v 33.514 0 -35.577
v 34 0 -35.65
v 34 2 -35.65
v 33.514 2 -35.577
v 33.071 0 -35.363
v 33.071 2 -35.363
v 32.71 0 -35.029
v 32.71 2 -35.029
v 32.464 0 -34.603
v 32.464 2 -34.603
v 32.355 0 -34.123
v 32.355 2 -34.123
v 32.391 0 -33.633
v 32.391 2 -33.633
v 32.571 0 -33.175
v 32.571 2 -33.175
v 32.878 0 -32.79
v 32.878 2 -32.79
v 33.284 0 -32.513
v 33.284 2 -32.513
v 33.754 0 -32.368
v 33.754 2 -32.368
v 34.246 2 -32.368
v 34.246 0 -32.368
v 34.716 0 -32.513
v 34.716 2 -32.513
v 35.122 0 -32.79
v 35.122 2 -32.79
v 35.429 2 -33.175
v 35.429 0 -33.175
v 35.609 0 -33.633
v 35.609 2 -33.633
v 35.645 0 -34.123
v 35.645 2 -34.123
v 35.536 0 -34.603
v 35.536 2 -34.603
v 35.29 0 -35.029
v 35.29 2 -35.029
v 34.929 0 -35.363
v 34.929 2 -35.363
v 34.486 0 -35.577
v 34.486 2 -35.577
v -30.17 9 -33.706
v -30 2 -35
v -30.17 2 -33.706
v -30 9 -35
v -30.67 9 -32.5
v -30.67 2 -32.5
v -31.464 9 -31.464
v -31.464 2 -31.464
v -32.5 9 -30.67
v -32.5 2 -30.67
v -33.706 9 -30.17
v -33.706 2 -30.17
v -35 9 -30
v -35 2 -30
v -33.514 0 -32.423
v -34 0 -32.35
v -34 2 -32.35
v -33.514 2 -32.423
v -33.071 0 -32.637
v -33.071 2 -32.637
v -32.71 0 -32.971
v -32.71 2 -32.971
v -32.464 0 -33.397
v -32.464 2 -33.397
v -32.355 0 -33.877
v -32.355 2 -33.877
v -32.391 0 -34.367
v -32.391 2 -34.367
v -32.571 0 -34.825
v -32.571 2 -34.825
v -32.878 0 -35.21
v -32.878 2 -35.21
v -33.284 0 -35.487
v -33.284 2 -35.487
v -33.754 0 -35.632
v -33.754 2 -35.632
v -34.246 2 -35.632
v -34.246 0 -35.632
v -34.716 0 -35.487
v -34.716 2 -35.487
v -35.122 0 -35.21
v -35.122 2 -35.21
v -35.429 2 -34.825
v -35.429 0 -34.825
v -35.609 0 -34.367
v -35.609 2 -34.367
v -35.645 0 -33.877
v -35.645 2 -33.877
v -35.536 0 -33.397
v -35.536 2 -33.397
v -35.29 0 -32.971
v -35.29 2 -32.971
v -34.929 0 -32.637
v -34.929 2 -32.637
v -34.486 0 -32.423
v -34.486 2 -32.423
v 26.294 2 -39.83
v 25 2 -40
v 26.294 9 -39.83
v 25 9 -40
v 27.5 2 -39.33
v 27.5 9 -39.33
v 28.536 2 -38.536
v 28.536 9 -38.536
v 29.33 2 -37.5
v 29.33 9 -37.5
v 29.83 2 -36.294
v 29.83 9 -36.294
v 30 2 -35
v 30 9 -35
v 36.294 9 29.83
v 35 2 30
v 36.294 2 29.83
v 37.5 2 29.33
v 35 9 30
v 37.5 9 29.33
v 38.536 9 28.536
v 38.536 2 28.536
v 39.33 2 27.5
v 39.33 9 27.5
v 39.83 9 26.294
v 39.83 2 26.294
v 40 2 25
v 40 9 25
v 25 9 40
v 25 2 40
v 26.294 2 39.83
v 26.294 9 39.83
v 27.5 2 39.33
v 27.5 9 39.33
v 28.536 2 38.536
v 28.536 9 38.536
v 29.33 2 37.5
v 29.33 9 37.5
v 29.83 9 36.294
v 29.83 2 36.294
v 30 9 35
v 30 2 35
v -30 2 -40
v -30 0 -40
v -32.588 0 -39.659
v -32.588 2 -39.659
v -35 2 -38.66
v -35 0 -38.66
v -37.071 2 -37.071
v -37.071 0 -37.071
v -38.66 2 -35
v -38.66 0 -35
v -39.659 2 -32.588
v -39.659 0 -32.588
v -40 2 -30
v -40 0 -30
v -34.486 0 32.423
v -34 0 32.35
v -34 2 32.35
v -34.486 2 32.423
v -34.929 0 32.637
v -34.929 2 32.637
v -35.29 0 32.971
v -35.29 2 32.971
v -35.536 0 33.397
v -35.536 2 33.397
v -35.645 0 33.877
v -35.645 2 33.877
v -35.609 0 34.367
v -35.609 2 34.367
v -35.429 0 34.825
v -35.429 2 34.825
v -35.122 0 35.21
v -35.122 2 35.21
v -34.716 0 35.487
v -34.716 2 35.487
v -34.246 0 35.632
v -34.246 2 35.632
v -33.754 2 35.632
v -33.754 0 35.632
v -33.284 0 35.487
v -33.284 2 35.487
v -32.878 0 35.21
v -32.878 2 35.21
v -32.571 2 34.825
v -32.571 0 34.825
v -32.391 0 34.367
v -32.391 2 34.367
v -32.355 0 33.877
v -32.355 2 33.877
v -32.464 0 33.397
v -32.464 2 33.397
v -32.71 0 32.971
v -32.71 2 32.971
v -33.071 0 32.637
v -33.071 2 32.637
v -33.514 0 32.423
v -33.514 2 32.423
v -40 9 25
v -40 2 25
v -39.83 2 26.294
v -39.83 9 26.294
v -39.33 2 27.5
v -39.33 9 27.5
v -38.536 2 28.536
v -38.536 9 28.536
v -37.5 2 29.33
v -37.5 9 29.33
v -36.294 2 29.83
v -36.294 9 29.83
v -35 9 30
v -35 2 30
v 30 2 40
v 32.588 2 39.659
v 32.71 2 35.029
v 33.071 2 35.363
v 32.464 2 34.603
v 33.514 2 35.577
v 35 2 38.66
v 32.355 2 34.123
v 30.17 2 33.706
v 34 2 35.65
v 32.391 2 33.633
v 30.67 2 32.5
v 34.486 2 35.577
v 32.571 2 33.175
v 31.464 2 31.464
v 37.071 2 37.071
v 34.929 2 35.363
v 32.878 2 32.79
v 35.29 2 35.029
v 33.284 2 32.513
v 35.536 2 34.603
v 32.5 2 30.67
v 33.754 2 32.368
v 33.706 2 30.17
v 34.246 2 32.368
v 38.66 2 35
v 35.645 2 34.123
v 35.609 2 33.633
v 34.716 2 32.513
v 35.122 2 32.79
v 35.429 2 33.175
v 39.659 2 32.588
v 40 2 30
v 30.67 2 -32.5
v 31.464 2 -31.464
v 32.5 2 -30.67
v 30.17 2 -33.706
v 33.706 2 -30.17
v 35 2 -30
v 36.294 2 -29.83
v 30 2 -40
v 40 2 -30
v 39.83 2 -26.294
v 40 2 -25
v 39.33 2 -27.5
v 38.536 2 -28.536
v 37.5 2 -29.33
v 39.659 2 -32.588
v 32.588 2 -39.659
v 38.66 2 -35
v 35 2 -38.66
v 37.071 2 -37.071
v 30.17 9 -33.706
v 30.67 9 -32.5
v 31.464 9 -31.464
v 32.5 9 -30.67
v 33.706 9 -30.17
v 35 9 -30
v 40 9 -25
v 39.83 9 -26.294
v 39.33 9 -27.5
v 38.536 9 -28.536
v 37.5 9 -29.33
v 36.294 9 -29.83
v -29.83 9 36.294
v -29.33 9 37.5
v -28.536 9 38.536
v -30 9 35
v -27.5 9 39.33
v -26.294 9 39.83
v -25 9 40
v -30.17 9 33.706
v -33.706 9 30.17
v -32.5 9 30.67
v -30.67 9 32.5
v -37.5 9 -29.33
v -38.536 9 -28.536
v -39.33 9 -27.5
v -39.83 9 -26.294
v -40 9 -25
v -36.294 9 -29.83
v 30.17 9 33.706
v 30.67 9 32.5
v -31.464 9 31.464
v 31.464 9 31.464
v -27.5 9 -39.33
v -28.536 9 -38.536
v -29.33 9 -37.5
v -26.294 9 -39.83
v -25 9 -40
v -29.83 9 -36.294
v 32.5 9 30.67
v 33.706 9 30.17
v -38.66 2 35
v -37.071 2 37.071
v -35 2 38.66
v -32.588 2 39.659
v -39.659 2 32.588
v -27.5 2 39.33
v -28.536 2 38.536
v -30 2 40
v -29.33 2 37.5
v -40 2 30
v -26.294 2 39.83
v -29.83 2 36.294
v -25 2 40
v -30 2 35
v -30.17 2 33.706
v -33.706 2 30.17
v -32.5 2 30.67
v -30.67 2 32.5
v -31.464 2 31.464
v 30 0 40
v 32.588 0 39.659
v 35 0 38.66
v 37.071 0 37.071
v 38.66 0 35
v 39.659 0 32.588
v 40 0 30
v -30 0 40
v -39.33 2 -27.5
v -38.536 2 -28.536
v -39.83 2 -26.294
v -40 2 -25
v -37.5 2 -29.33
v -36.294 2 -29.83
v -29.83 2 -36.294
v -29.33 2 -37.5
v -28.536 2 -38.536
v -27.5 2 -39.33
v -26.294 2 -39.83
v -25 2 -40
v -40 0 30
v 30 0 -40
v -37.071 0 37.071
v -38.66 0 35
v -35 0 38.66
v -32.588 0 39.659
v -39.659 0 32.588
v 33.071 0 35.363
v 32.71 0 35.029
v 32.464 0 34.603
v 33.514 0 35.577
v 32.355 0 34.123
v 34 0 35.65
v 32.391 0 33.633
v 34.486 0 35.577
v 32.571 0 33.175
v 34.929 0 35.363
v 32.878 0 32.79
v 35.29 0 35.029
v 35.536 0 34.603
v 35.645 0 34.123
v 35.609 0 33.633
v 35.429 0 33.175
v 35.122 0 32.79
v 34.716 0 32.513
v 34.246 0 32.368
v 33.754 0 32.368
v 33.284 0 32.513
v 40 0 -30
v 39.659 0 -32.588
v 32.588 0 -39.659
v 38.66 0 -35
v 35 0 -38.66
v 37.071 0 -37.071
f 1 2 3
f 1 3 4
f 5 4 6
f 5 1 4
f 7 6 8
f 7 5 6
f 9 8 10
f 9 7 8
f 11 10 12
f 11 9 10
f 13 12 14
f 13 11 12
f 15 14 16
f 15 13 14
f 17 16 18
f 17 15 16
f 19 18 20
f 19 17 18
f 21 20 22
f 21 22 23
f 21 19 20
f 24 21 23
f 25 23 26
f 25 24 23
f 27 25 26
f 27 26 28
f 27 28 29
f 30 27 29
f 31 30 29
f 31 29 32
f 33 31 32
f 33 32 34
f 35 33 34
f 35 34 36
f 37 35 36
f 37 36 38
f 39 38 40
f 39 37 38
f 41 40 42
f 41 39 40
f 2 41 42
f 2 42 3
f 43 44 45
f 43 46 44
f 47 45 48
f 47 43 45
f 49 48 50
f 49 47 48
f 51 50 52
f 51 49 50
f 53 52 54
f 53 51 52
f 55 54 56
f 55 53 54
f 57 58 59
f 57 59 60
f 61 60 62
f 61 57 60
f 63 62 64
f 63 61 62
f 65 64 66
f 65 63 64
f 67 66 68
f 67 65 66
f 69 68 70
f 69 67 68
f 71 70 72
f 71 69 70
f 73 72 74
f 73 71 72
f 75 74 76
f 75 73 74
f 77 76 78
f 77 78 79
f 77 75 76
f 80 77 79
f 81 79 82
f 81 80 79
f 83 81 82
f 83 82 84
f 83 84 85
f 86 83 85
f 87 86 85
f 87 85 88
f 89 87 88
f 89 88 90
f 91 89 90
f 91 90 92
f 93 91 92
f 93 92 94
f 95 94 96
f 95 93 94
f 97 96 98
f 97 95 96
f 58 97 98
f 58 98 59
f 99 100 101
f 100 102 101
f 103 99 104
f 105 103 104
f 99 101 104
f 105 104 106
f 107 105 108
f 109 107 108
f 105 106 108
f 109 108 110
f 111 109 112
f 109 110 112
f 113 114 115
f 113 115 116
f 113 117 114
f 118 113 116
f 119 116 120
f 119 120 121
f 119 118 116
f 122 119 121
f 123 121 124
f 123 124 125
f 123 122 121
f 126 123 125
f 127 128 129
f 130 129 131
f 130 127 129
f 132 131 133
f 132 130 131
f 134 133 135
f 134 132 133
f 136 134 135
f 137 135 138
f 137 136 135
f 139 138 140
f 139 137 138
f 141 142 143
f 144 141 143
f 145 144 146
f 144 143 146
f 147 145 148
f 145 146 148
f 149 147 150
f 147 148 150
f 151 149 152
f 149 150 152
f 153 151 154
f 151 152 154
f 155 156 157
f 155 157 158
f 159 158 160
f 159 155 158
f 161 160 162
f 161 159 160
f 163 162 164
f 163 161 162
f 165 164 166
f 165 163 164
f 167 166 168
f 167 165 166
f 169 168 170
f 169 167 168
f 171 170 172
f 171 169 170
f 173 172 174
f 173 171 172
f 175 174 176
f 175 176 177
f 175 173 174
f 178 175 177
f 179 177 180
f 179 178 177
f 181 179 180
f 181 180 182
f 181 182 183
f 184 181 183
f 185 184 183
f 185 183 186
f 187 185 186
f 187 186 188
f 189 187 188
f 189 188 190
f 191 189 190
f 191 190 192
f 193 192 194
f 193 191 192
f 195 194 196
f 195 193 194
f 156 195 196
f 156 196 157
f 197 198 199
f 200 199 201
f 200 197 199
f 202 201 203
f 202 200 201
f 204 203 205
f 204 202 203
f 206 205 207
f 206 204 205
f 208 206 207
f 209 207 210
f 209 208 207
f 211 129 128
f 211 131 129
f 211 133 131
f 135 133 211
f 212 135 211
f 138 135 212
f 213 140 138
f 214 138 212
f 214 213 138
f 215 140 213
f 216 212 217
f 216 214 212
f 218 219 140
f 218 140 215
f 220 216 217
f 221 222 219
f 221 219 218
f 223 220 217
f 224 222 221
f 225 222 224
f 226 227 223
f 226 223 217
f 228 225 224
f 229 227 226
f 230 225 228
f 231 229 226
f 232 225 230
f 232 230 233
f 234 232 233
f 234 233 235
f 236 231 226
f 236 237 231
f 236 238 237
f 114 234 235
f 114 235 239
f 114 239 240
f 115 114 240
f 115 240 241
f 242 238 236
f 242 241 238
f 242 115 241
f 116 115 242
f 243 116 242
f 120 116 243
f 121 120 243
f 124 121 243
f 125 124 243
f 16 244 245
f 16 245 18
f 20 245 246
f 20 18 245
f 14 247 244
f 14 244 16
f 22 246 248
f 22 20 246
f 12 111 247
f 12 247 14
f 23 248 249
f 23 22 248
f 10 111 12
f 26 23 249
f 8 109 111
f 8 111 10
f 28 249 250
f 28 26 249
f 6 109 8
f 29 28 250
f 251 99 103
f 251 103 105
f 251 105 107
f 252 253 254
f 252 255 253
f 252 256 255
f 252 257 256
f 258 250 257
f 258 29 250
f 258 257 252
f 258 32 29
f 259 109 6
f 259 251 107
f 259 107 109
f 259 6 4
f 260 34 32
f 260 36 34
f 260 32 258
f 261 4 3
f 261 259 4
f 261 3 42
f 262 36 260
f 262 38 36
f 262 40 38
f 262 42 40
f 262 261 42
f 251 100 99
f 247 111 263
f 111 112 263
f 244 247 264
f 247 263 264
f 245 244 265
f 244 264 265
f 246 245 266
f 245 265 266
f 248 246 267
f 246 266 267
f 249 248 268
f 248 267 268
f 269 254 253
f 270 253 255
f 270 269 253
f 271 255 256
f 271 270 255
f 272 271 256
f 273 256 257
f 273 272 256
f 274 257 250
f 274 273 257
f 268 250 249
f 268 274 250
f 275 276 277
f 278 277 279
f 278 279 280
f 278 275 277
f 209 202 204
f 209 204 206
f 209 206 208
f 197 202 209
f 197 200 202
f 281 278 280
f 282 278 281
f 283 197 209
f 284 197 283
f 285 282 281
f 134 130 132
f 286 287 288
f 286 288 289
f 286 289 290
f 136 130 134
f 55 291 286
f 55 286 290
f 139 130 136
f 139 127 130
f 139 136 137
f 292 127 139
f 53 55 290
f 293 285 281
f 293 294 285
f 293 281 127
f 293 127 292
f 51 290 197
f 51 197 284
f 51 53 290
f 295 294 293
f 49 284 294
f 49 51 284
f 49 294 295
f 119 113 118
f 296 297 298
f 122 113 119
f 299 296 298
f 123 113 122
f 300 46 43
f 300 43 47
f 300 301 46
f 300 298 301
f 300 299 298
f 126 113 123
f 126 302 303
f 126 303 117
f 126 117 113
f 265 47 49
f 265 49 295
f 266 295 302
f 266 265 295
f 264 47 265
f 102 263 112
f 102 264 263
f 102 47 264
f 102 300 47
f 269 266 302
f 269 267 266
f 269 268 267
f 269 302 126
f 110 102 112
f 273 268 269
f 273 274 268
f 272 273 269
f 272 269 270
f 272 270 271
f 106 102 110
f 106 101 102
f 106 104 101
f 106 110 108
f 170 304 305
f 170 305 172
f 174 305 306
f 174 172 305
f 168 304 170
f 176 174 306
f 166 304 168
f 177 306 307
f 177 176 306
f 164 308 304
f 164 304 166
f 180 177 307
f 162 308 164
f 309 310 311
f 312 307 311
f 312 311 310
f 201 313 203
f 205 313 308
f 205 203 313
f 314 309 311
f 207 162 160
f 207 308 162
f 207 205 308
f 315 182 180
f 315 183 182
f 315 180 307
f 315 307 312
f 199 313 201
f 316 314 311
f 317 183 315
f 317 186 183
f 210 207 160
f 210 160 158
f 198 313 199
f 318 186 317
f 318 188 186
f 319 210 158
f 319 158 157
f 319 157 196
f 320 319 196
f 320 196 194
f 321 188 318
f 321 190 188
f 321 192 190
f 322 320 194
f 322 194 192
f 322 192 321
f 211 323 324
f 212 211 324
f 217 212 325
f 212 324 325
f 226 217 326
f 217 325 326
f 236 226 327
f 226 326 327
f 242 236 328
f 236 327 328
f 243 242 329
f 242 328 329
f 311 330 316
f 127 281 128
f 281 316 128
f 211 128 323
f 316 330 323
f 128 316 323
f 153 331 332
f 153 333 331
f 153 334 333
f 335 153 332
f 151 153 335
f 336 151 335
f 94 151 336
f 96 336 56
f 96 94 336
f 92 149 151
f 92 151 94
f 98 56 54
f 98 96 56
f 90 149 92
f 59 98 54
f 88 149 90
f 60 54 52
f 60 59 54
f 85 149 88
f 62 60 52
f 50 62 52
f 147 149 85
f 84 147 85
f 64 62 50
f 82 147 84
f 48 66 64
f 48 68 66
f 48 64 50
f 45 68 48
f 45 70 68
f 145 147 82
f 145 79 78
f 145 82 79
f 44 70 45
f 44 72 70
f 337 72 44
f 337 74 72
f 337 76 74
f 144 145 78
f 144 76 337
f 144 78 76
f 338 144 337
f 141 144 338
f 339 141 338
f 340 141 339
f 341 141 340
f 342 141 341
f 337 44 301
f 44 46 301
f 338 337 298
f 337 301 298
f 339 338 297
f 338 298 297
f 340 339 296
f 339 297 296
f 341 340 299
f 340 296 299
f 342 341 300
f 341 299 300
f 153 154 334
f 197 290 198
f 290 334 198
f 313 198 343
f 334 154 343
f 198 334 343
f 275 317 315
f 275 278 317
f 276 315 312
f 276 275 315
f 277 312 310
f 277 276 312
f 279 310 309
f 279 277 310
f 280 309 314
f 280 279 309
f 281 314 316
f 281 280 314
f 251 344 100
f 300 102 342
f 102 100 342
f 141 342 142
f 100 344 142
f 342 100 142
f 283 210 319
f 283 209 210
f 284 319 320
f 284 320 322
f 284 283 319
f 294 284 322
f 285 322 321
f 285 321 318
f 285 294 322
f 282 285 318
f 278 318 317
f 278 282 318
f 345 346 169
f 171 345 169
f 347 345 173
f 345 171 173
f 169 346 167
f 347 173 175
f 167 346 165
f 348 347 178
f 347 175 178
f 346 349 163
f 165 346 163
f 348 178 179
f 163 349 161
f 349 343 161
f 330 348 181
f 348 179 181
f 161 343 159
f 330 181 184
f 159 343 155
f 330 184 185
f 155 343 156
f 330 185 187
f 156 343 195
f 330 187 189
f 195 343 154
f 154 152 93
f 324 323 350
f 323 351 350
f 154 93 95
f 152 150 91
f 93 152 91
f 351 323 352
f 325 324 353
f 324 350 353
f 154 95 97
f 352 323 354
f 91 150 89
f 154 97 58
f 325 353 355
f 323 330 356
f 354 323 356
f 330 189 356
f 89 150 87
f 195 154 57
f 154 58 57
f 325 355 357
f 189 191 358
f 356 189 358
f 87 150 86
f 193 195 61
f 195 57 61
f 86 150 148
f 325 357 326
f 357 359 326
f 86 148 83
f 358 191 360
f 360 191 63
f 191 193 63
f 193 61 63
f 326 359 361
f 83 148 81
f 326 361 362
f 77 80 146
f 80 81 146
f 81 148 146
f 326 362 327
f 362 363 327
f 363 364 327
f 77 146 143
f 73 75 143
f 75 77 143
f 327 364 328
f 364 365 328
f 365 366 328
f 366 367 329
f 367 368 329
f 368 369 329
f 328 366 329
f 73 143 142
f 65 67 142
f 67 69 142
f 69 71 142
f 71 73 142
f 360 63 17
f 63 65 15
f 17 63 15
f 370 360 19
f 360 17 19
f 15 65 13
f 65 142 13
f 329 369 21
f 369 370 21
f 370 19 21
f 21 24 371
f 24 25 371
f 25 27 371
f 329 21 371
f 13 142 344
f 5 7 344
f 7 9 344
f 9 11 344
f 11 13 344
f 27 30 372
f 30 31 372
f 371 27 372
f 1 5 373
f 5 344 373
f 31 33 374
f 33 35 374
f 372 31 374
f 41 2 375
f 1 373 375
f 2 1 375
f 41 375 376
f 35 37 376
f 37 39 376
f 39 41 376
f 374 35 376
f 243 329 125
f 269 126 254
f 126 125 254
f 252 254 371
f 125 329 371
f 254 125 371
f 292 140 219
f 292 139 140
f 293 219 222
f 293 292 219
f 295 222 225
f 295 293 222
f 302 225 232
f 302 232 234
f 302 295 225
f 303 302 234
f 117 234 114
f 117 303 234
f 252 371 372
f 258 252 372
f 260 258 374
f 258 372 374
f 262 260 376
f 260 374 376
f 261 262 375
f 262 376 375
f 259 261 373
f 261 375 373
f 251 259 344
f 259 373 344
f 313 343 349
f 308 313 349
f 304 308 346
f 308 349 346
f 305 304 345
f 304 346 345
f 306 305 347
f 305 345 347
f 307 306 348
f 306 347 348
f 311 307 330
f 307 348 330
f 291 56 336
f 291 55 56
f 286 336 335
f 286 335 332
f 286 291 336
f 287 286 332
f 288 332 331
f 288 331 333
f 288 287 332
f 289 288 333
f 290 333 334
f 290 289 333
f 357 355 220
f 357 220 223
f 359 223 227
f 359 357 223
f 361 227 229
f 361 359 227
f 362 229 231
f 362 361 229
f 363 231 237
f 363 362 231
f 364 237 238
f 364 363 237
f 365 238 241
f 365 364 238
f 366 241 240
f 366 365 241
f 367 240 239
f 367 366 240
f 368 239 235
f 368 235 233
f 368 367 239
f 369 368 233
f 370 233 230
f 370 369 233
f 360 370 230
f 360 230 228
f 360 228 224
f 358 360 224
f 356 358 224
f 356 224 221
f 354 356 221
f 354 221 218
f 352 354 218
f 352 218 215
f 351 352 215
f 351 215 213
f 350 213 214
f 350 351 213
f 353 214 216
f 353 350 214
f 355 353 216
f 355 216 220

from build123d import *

# Parameters (mm, degrees)
SKETCH_1_R      = 1.65
EXTRUDE_1_DEPTH = 2
EXTRUDE_2_DEPTH = 7
FILLET_1_R      = 5


with BuildPart() as part:
    # 草图1 → 凸台-拉伸1 (new body)
    with BuildSketch(Plane(origin=(0, 0, 0), x_dir=(1, 0, 0), z_dir=(0, 1, 0))):
        with BuildLine():
            Line((-30, -40), (30, -40))
            ThreePointArc((30, -40), (37.071067812, -37.071067812), (40, -30))
            Line((40, -30), (40, 30))
            ThreePointArc((40, 30), (37.071067812, 37.071067812), (30, 40))
            Line((30, 40), (-30, 40))
            ThreePointArc((-30, 40), (-37.071067812, 37.071067812), (-40, 30))
            Line((-40, 30), (-40, -30))
            ThreePointArc((-40, -30), (-37.071067812, -37.071067812), (-30, -40))
        make_face()
        with Locations(Location((-34, 34, 0), (0, 0, 270))):
            Circle(SKETCH_1_R, mode=Mode.SUBTRACT)
        with Locations(Location((-34, -34, 0), (0, 0, 90))):
            Circle(SKETCH_1_R, mode=Mode.SUBTRACT)
        with Locations(Location((34, 34, 0), (0, 0, 90))):
            Circle(SKETCH_1_R, mode=Mode.SUBTRACT)
        with Locations(Location((34, -34, 0), (0, 0, 270))):
            Circle(SKETCH_1_R, mode=Mode.SUBTRACT)
    extrude(amount=EXTRUDE_1_DEPTH)

    # 草图2 → 凸台-拉伸2 (add)
    with BuildSketch(Plane(origin=(0, 2, 0), x_dir=(1, 0, 0), z_dir=(0, 1, 0))):
        Polygon((-30, 40), (-30, 30), (-40, 30), (-40, -30), (-30, -30), (-30, -40), (30, -40), (30, -30), (40, -30), (40, 30), (30, 30), (30, 40), align=None)
    extrude(amount=EXTRUDE_2_DEPTH)

    # 圆角1
    fillet_1_edges = [part.edges().sort_by_distance(p)[0] for p in [
        (-40, 5.5, -30),
        (-30, 5.5, -30),
        (-30, 5.5, -40),
        (30, 5.5, -40),
        (30, 5.5, -30),
        (40, 5.5, -30),
        (40, 5.5, 30),
        (30, 5.5, 30),
        (30, 5.5, 40),
        (-40, 5.5, 30),
        (-30, 5.5, 30),
        (-30, 5.5, 40),
    ]]
    fillet(fillet_1_edges, radius=FILLET_1_R - 0.0001)  # a hair under: the kernel refuses the full size


solid = part.part
